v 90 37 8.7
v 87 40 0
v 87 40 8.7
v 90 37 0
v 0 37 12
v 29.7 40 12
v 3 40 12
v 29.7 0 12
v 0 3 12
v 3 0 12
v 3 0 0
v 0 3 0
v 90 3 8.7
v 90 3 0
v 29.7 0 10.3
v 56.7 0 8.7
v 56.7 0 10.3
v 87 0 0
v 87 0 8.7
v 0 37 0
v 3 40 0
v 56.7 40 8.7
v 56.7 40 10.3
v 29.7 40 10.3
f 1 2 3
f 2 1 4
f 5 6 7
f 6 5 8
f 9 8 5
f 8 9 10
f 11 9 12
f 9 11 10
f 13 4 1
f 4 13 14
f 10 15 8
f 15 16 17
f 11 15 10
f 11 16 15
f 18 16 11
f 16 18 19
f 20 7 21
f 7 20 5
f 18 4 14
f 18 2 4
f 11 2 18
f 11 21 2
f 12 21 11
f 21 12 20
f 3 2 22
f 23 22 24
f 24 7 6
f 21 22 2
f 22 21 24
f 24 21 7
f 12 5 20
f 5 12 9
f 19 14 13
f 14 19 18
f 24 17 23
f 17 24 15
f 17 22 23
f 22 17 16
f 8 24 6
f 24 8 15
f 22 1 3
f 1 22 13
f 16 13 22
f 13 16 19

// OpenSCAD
$fn = 32;

// ----------------------------------------------------------------------
// Stepped bar: twostep, 90 x 40 x 12/8.7 mm
// ----------------------------------------------------------------------

// --- parameters (mm) ---
bar_l = 90;               // bar length, X
bar_w = 40;               // bar width, Y
plate_t = 12;             // thickness of the thick zone, Z
thin_t = 8.7;             // thickness of the thin zone
corner_c = 3;             // corner chamfer of the bar
step_cut = 3.3;           // material removed from the thin zone
stair1_x = 29.7;          // position of the first stair
stair2_x = 56.7;          // position of the second stair
mid_t = 10.3;             // thickness of the middle zone
depth_1 = 1.7;            // depth of cut 1 from the top face
depth_2 = 3.3;            // depth of cut 2 from the top face

profile = [[3, 0], [87, 0], [90, 3], [90, 37], [87, 40], [3, 40], [0, 37], [0, 3]];  // primary outline, 8 points, counter clockwise
void_1 = [[29.7, -1], [56.7, -1], [56.7, 41], [29.7, 41]];  // first stair, 4 points
void_2 = [[56.7, -1], [91, -1], [91, 41], [56.7, 41]];  // second stair, 4 points

// --- the one profile operation ---
difference() {
  linear_extrude(height = plate_t) polygon(points = profile);
  translate([0, 0, plate_t - depth_1])
    linear_extrude(height = depth_1 + 1) polygon(points = void_1);
  translate([0, 0, plate_t - depth_2])
    linear_extrude(height = depth_2 + 1) polygon(points = void_2);
}
